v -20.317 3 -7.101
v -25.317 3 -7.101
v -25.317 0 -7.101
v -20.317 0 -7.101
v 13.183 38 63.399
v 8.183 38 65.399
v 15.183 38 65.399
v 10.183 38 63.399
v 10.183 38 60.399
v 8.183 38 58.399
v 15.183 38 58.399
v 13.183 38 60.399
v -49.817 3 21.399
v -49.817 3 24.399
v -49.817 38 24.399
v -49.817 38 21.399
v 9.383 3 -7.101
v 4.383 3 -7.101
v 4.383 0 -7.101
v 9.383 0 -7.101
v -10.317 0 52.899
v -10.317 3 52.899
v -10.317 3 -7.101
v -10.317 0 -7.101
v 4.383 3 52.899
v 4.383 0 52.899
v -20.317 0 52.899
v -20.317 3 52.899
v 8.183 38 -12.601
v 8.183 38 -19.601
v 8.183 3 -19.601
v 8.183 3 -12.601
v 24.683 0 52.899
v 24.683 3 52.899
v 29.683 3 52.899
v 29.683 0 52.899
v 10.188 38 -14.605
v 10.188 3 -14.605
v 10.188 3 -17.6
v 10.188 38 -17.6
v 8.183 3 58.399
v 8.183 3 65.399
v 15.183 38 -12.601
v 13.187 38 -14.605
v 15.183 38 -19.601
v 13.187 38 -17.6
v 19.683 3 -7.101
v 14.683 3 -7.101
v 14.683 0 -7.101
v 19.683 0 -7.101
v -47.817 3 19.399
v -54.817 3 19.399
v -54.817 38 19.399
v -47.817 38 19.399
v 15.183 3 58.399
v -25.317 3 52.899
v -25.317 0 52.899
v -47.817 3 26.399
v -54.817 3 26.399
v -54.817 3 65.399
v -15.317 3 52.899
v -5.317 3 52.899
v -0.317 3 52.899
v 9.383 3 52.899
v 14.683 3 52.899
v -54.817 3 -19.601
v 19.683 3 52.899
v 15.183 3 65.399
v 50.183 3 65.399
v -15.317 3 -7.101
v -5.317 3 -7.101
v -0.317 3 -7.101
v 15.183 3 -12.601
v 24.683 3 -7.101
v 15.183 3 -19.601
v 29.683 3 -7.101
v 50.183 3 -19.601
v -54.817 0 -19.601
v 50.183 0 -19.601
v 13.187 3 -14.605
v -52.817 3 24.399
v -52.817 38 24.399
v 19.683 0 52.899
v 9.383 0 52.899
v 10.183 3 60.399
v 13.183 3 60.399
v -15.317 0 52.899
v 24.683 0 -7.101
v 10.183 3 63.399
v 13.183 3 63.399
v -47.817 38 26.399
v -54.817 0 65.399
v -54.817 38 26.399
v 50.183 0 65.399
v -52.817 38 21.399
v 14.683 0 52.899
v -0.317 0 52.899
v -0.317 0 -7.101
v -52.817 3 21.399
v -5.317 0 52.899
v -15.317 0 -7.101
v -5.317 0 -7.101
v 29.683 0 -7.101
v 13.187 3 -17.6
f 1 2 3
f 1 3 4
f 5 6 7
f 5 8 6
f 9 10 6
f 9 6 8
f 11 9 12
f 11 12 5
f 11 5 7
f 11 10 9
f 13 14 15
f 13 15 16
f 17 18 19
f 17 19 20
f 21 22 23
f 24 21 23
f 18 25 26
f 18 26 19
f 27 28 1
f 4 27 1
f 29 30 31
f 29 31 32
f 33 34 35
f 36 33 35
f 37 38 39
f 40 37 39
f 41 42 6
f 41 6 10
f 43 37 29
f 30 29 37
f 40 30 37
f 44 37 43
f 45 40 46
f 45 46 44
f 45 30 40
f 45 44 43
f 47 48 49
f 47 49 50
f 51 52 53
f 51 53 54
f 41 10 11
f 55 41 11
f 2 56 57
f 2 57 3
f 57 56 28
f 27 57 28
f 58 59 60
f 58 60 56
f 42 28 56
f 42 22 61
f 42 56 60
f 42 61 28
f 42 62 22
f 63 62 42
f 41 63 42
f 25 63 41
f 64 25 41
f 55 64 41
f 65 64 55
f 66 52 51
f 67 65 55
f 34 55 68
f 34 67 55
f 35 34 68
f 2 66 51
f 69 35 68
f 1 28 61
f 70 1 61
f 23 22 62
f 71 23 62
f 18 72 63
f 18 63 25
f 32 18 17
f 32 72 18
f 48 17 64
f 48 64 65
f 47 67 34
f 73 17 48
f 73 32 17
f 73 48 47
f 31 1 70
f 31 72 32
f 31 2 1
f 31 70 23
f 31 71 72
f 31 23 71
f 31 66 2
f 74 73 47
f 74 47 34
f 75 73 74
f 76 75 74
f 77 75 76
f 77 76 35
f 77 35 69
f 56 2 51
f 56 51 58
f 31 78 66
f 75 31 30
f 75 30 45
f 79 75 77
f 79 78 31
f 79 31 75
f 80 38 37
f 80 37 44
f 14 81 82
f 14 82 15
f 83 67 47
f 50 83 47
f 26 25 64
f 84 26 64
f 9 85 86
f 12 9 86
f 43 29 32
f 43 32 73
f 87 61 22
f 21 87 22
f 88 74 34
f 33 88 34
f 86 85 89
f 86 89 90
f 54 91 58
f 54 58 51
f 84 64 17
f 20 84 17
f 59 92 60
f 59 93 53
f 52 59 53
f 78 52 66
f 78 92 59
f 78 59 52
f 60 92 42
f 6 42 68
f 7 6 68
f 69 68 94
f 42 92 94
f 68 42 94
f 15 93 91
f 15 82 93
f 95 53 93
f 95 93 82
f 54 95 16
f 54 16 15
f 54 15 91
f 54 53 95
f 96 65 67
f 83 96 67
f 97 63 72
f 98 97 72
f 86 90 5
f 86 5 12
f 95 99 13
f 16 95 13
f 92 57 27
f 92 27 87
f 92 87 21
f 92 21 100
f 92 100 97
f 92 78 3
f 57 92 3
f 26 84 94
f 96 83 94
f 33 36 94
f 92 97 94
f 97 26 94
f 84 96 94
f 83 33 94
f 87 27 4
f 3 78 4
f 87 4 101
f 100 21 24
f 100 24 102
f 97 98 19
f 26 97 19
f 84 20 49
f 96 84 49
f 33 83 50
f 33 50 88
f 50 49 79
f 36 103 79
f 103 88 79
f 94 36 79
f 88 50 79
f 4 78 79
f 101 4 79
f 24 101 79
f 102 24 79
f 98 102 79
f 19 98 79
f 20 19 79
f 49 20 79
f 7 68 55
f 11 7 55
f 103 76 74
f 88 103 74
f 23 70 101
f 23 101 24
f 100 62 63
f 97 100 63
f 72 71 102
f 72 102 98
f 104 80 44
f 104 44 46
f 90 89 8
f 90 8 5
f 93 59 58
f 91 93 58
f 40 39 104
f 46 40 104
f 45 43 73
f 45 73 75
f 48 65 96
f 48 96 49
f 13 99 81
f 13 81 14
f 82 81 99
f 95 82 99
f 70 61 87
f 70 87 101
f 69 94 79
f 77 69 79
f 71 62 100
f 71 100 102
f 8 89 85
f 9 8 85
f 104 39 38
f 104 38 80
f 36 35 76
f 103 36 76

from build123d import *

# Parameters (mm, degrees)
SKETCH3_W           = 105
SKETCH3_H           = 85
BOSS_EXTRUDE3_DEPTH = 3
SKETCH5_W           = 7
SKETCH5_H           = 7
SKETCH5_W_2         = 3
SKETCH5_H_2         = 3
BOSS_EXTRUDE4_DEPTH = 35
SKETCH9_W           = 2.998895248
SKETCH9_H           = 2.995380601
BOSS_EXTRUDE5_DEPTH = 35
SKETCH11_W          = 7
SKETCH11_H          = 7
SKETCH11_W_2        = 3
SKETCH11_H_2        = 3
BOSS_EXTRUDE6_DEPTH = 35
CUT_EXTRUDE1_DEPTH  = 6
SKETCH14_W          = 5
SKETCH14_H          = 60
CUT_EXTRUDE3_DEPTH  = 33
SKETCH17_W          = 5
SKETCH17_H          = 60
CUT_EXTRUDE4_DEPTH  = 15


with BuildPart() as part:
    # Sketch3 → Boss-Extrude3 (new body)
    with BuildSketch(Plane(origin=(0, 0, 0), x_dir=(1, 0, 0), z_dir=(0, 1, 0))):
        with Locations((-2.316884661, -22.898810939)):
            Rectangle(SKETCH3_W, SKETCH3_H)
    extrude(amount=BOSS_EXTRUDE3_DEPTH)

    # Sketch5 → Boss-Extrude4 (add)
    with BuildSketch(Plane(origin=(0, 3, 0), x_dir=(1, 0, 0), z_dir=(0, 1, 0))):
        with Locations((11.683115339, -61.898810939)):
            Rectangle(SKETCH5_W, SKETCH5_H)
        with Locations((11.683115339, -61.898810939)):
            Rectangle(SKETCH5_W_2, SKETCH5_H_2, mode=Mode.SUBTRACT)
    extrude(amount=BOSS_EXTRUDE4_DEPTH)

    # Sketch9 → Boss-Extrude5 (add)
    with BuildSketch(Plane(origin=(0, 3, 0), x_dir=(1, 0, 0), z_dir=(0, 1, 0))):
        Polygon((15.183115339, 12.601189061), (15.183115339, 19.601189061), (8.183115339, 19.601189061), (8.183115339, 17.600348451), (8.183115339, 12.601189061), align=None)
        with Locations((11.687877227, 16.102658151)):
            Rectangle(SKETCH9_W, SKETCH9_H, mode=Mode.SUBTRACT)
    extrude(amount=BOSS_EXTRUDE5_DEPTH)

    # Sketch11 → Boss-Extrude6 (add)
    with BuildSketch(Plane(origin=(0, 3, 0), x_dir=(1, 0, 0), z_dir=(0, 1, 0))):
        with Locations((-51.316884661, -22.898810939)):
            Rectangle(SKETCH11_W, SKETCH11_H)
        with Locations((-51.316884661, -22.898810939)):
            Rectangle(SKETCH11_W_2, SKETCH11_H_2, mode=Mode.SUBTRACT)
    extrude(amount=BOSS_EXTRUDE6_DEPTH)

    # Sketch12 → Cut-Extrude1 (cut)
    with BuildSketch(Plane(origin=(0, 3, 0), x_dir=(1, 0, 0), z_dir=(0, 1, 0))):
        Polygon((29.683115339, -52.898810939), (29.683115339, -48.898810939), (29.683115339, 3.101189061), (29.683115339, 7.101189061), (24.683115339, 7.101189061), (24.683115339, -52.898810939), align=None)
    extrude(amount=-CUT_EXTRUDE1_DEPTH, mode=Mode.SUBTRACT)

    # Sketch14 → Cut-Extrude3 (cut)
    with BuildSketch(Plane(origin=(0, 3, 0), x_dir=(1, 0, 0), z_dir=(0, 1, 0))):
        with Locations((17.183115339, -22.898810939)):
            Rectangle(SKETCH14_W, SKETCH14_H)
        with Locations((-2.816884661, -22.898810939)):
            Rectangle(SKETCH14_W, SKETCH14_H)
        with Locations((-22.816884661, -22.898810939)):
            Rectangle(SKETCH14_W, SKETCH14_H)
        with Locations((-12.816884661, -22.898810939)):
            Rectangle(SKETCH14_W, SKETCH14_H)
    extrude(amount=-CUT_EXTRUDE3_DEPTH, mode=Mode.SUBTRACT)

    # Sketch17 → Cut-Extrude4 (cut)
    with BuildSketch(Plane(origin=(0, 3, 0), x_dir=(1, 0, 0), z_dir=(0, 1, 0))):
        with Locations((6.882849783, -22.898810939)):
            Rectangle(SKETCH17_W, SKETCH17_H)
    extrude(amount=-CUT_EXTRUDE4_DEPTH, mode=Mode.SUBTRACT)


solid = part.part
